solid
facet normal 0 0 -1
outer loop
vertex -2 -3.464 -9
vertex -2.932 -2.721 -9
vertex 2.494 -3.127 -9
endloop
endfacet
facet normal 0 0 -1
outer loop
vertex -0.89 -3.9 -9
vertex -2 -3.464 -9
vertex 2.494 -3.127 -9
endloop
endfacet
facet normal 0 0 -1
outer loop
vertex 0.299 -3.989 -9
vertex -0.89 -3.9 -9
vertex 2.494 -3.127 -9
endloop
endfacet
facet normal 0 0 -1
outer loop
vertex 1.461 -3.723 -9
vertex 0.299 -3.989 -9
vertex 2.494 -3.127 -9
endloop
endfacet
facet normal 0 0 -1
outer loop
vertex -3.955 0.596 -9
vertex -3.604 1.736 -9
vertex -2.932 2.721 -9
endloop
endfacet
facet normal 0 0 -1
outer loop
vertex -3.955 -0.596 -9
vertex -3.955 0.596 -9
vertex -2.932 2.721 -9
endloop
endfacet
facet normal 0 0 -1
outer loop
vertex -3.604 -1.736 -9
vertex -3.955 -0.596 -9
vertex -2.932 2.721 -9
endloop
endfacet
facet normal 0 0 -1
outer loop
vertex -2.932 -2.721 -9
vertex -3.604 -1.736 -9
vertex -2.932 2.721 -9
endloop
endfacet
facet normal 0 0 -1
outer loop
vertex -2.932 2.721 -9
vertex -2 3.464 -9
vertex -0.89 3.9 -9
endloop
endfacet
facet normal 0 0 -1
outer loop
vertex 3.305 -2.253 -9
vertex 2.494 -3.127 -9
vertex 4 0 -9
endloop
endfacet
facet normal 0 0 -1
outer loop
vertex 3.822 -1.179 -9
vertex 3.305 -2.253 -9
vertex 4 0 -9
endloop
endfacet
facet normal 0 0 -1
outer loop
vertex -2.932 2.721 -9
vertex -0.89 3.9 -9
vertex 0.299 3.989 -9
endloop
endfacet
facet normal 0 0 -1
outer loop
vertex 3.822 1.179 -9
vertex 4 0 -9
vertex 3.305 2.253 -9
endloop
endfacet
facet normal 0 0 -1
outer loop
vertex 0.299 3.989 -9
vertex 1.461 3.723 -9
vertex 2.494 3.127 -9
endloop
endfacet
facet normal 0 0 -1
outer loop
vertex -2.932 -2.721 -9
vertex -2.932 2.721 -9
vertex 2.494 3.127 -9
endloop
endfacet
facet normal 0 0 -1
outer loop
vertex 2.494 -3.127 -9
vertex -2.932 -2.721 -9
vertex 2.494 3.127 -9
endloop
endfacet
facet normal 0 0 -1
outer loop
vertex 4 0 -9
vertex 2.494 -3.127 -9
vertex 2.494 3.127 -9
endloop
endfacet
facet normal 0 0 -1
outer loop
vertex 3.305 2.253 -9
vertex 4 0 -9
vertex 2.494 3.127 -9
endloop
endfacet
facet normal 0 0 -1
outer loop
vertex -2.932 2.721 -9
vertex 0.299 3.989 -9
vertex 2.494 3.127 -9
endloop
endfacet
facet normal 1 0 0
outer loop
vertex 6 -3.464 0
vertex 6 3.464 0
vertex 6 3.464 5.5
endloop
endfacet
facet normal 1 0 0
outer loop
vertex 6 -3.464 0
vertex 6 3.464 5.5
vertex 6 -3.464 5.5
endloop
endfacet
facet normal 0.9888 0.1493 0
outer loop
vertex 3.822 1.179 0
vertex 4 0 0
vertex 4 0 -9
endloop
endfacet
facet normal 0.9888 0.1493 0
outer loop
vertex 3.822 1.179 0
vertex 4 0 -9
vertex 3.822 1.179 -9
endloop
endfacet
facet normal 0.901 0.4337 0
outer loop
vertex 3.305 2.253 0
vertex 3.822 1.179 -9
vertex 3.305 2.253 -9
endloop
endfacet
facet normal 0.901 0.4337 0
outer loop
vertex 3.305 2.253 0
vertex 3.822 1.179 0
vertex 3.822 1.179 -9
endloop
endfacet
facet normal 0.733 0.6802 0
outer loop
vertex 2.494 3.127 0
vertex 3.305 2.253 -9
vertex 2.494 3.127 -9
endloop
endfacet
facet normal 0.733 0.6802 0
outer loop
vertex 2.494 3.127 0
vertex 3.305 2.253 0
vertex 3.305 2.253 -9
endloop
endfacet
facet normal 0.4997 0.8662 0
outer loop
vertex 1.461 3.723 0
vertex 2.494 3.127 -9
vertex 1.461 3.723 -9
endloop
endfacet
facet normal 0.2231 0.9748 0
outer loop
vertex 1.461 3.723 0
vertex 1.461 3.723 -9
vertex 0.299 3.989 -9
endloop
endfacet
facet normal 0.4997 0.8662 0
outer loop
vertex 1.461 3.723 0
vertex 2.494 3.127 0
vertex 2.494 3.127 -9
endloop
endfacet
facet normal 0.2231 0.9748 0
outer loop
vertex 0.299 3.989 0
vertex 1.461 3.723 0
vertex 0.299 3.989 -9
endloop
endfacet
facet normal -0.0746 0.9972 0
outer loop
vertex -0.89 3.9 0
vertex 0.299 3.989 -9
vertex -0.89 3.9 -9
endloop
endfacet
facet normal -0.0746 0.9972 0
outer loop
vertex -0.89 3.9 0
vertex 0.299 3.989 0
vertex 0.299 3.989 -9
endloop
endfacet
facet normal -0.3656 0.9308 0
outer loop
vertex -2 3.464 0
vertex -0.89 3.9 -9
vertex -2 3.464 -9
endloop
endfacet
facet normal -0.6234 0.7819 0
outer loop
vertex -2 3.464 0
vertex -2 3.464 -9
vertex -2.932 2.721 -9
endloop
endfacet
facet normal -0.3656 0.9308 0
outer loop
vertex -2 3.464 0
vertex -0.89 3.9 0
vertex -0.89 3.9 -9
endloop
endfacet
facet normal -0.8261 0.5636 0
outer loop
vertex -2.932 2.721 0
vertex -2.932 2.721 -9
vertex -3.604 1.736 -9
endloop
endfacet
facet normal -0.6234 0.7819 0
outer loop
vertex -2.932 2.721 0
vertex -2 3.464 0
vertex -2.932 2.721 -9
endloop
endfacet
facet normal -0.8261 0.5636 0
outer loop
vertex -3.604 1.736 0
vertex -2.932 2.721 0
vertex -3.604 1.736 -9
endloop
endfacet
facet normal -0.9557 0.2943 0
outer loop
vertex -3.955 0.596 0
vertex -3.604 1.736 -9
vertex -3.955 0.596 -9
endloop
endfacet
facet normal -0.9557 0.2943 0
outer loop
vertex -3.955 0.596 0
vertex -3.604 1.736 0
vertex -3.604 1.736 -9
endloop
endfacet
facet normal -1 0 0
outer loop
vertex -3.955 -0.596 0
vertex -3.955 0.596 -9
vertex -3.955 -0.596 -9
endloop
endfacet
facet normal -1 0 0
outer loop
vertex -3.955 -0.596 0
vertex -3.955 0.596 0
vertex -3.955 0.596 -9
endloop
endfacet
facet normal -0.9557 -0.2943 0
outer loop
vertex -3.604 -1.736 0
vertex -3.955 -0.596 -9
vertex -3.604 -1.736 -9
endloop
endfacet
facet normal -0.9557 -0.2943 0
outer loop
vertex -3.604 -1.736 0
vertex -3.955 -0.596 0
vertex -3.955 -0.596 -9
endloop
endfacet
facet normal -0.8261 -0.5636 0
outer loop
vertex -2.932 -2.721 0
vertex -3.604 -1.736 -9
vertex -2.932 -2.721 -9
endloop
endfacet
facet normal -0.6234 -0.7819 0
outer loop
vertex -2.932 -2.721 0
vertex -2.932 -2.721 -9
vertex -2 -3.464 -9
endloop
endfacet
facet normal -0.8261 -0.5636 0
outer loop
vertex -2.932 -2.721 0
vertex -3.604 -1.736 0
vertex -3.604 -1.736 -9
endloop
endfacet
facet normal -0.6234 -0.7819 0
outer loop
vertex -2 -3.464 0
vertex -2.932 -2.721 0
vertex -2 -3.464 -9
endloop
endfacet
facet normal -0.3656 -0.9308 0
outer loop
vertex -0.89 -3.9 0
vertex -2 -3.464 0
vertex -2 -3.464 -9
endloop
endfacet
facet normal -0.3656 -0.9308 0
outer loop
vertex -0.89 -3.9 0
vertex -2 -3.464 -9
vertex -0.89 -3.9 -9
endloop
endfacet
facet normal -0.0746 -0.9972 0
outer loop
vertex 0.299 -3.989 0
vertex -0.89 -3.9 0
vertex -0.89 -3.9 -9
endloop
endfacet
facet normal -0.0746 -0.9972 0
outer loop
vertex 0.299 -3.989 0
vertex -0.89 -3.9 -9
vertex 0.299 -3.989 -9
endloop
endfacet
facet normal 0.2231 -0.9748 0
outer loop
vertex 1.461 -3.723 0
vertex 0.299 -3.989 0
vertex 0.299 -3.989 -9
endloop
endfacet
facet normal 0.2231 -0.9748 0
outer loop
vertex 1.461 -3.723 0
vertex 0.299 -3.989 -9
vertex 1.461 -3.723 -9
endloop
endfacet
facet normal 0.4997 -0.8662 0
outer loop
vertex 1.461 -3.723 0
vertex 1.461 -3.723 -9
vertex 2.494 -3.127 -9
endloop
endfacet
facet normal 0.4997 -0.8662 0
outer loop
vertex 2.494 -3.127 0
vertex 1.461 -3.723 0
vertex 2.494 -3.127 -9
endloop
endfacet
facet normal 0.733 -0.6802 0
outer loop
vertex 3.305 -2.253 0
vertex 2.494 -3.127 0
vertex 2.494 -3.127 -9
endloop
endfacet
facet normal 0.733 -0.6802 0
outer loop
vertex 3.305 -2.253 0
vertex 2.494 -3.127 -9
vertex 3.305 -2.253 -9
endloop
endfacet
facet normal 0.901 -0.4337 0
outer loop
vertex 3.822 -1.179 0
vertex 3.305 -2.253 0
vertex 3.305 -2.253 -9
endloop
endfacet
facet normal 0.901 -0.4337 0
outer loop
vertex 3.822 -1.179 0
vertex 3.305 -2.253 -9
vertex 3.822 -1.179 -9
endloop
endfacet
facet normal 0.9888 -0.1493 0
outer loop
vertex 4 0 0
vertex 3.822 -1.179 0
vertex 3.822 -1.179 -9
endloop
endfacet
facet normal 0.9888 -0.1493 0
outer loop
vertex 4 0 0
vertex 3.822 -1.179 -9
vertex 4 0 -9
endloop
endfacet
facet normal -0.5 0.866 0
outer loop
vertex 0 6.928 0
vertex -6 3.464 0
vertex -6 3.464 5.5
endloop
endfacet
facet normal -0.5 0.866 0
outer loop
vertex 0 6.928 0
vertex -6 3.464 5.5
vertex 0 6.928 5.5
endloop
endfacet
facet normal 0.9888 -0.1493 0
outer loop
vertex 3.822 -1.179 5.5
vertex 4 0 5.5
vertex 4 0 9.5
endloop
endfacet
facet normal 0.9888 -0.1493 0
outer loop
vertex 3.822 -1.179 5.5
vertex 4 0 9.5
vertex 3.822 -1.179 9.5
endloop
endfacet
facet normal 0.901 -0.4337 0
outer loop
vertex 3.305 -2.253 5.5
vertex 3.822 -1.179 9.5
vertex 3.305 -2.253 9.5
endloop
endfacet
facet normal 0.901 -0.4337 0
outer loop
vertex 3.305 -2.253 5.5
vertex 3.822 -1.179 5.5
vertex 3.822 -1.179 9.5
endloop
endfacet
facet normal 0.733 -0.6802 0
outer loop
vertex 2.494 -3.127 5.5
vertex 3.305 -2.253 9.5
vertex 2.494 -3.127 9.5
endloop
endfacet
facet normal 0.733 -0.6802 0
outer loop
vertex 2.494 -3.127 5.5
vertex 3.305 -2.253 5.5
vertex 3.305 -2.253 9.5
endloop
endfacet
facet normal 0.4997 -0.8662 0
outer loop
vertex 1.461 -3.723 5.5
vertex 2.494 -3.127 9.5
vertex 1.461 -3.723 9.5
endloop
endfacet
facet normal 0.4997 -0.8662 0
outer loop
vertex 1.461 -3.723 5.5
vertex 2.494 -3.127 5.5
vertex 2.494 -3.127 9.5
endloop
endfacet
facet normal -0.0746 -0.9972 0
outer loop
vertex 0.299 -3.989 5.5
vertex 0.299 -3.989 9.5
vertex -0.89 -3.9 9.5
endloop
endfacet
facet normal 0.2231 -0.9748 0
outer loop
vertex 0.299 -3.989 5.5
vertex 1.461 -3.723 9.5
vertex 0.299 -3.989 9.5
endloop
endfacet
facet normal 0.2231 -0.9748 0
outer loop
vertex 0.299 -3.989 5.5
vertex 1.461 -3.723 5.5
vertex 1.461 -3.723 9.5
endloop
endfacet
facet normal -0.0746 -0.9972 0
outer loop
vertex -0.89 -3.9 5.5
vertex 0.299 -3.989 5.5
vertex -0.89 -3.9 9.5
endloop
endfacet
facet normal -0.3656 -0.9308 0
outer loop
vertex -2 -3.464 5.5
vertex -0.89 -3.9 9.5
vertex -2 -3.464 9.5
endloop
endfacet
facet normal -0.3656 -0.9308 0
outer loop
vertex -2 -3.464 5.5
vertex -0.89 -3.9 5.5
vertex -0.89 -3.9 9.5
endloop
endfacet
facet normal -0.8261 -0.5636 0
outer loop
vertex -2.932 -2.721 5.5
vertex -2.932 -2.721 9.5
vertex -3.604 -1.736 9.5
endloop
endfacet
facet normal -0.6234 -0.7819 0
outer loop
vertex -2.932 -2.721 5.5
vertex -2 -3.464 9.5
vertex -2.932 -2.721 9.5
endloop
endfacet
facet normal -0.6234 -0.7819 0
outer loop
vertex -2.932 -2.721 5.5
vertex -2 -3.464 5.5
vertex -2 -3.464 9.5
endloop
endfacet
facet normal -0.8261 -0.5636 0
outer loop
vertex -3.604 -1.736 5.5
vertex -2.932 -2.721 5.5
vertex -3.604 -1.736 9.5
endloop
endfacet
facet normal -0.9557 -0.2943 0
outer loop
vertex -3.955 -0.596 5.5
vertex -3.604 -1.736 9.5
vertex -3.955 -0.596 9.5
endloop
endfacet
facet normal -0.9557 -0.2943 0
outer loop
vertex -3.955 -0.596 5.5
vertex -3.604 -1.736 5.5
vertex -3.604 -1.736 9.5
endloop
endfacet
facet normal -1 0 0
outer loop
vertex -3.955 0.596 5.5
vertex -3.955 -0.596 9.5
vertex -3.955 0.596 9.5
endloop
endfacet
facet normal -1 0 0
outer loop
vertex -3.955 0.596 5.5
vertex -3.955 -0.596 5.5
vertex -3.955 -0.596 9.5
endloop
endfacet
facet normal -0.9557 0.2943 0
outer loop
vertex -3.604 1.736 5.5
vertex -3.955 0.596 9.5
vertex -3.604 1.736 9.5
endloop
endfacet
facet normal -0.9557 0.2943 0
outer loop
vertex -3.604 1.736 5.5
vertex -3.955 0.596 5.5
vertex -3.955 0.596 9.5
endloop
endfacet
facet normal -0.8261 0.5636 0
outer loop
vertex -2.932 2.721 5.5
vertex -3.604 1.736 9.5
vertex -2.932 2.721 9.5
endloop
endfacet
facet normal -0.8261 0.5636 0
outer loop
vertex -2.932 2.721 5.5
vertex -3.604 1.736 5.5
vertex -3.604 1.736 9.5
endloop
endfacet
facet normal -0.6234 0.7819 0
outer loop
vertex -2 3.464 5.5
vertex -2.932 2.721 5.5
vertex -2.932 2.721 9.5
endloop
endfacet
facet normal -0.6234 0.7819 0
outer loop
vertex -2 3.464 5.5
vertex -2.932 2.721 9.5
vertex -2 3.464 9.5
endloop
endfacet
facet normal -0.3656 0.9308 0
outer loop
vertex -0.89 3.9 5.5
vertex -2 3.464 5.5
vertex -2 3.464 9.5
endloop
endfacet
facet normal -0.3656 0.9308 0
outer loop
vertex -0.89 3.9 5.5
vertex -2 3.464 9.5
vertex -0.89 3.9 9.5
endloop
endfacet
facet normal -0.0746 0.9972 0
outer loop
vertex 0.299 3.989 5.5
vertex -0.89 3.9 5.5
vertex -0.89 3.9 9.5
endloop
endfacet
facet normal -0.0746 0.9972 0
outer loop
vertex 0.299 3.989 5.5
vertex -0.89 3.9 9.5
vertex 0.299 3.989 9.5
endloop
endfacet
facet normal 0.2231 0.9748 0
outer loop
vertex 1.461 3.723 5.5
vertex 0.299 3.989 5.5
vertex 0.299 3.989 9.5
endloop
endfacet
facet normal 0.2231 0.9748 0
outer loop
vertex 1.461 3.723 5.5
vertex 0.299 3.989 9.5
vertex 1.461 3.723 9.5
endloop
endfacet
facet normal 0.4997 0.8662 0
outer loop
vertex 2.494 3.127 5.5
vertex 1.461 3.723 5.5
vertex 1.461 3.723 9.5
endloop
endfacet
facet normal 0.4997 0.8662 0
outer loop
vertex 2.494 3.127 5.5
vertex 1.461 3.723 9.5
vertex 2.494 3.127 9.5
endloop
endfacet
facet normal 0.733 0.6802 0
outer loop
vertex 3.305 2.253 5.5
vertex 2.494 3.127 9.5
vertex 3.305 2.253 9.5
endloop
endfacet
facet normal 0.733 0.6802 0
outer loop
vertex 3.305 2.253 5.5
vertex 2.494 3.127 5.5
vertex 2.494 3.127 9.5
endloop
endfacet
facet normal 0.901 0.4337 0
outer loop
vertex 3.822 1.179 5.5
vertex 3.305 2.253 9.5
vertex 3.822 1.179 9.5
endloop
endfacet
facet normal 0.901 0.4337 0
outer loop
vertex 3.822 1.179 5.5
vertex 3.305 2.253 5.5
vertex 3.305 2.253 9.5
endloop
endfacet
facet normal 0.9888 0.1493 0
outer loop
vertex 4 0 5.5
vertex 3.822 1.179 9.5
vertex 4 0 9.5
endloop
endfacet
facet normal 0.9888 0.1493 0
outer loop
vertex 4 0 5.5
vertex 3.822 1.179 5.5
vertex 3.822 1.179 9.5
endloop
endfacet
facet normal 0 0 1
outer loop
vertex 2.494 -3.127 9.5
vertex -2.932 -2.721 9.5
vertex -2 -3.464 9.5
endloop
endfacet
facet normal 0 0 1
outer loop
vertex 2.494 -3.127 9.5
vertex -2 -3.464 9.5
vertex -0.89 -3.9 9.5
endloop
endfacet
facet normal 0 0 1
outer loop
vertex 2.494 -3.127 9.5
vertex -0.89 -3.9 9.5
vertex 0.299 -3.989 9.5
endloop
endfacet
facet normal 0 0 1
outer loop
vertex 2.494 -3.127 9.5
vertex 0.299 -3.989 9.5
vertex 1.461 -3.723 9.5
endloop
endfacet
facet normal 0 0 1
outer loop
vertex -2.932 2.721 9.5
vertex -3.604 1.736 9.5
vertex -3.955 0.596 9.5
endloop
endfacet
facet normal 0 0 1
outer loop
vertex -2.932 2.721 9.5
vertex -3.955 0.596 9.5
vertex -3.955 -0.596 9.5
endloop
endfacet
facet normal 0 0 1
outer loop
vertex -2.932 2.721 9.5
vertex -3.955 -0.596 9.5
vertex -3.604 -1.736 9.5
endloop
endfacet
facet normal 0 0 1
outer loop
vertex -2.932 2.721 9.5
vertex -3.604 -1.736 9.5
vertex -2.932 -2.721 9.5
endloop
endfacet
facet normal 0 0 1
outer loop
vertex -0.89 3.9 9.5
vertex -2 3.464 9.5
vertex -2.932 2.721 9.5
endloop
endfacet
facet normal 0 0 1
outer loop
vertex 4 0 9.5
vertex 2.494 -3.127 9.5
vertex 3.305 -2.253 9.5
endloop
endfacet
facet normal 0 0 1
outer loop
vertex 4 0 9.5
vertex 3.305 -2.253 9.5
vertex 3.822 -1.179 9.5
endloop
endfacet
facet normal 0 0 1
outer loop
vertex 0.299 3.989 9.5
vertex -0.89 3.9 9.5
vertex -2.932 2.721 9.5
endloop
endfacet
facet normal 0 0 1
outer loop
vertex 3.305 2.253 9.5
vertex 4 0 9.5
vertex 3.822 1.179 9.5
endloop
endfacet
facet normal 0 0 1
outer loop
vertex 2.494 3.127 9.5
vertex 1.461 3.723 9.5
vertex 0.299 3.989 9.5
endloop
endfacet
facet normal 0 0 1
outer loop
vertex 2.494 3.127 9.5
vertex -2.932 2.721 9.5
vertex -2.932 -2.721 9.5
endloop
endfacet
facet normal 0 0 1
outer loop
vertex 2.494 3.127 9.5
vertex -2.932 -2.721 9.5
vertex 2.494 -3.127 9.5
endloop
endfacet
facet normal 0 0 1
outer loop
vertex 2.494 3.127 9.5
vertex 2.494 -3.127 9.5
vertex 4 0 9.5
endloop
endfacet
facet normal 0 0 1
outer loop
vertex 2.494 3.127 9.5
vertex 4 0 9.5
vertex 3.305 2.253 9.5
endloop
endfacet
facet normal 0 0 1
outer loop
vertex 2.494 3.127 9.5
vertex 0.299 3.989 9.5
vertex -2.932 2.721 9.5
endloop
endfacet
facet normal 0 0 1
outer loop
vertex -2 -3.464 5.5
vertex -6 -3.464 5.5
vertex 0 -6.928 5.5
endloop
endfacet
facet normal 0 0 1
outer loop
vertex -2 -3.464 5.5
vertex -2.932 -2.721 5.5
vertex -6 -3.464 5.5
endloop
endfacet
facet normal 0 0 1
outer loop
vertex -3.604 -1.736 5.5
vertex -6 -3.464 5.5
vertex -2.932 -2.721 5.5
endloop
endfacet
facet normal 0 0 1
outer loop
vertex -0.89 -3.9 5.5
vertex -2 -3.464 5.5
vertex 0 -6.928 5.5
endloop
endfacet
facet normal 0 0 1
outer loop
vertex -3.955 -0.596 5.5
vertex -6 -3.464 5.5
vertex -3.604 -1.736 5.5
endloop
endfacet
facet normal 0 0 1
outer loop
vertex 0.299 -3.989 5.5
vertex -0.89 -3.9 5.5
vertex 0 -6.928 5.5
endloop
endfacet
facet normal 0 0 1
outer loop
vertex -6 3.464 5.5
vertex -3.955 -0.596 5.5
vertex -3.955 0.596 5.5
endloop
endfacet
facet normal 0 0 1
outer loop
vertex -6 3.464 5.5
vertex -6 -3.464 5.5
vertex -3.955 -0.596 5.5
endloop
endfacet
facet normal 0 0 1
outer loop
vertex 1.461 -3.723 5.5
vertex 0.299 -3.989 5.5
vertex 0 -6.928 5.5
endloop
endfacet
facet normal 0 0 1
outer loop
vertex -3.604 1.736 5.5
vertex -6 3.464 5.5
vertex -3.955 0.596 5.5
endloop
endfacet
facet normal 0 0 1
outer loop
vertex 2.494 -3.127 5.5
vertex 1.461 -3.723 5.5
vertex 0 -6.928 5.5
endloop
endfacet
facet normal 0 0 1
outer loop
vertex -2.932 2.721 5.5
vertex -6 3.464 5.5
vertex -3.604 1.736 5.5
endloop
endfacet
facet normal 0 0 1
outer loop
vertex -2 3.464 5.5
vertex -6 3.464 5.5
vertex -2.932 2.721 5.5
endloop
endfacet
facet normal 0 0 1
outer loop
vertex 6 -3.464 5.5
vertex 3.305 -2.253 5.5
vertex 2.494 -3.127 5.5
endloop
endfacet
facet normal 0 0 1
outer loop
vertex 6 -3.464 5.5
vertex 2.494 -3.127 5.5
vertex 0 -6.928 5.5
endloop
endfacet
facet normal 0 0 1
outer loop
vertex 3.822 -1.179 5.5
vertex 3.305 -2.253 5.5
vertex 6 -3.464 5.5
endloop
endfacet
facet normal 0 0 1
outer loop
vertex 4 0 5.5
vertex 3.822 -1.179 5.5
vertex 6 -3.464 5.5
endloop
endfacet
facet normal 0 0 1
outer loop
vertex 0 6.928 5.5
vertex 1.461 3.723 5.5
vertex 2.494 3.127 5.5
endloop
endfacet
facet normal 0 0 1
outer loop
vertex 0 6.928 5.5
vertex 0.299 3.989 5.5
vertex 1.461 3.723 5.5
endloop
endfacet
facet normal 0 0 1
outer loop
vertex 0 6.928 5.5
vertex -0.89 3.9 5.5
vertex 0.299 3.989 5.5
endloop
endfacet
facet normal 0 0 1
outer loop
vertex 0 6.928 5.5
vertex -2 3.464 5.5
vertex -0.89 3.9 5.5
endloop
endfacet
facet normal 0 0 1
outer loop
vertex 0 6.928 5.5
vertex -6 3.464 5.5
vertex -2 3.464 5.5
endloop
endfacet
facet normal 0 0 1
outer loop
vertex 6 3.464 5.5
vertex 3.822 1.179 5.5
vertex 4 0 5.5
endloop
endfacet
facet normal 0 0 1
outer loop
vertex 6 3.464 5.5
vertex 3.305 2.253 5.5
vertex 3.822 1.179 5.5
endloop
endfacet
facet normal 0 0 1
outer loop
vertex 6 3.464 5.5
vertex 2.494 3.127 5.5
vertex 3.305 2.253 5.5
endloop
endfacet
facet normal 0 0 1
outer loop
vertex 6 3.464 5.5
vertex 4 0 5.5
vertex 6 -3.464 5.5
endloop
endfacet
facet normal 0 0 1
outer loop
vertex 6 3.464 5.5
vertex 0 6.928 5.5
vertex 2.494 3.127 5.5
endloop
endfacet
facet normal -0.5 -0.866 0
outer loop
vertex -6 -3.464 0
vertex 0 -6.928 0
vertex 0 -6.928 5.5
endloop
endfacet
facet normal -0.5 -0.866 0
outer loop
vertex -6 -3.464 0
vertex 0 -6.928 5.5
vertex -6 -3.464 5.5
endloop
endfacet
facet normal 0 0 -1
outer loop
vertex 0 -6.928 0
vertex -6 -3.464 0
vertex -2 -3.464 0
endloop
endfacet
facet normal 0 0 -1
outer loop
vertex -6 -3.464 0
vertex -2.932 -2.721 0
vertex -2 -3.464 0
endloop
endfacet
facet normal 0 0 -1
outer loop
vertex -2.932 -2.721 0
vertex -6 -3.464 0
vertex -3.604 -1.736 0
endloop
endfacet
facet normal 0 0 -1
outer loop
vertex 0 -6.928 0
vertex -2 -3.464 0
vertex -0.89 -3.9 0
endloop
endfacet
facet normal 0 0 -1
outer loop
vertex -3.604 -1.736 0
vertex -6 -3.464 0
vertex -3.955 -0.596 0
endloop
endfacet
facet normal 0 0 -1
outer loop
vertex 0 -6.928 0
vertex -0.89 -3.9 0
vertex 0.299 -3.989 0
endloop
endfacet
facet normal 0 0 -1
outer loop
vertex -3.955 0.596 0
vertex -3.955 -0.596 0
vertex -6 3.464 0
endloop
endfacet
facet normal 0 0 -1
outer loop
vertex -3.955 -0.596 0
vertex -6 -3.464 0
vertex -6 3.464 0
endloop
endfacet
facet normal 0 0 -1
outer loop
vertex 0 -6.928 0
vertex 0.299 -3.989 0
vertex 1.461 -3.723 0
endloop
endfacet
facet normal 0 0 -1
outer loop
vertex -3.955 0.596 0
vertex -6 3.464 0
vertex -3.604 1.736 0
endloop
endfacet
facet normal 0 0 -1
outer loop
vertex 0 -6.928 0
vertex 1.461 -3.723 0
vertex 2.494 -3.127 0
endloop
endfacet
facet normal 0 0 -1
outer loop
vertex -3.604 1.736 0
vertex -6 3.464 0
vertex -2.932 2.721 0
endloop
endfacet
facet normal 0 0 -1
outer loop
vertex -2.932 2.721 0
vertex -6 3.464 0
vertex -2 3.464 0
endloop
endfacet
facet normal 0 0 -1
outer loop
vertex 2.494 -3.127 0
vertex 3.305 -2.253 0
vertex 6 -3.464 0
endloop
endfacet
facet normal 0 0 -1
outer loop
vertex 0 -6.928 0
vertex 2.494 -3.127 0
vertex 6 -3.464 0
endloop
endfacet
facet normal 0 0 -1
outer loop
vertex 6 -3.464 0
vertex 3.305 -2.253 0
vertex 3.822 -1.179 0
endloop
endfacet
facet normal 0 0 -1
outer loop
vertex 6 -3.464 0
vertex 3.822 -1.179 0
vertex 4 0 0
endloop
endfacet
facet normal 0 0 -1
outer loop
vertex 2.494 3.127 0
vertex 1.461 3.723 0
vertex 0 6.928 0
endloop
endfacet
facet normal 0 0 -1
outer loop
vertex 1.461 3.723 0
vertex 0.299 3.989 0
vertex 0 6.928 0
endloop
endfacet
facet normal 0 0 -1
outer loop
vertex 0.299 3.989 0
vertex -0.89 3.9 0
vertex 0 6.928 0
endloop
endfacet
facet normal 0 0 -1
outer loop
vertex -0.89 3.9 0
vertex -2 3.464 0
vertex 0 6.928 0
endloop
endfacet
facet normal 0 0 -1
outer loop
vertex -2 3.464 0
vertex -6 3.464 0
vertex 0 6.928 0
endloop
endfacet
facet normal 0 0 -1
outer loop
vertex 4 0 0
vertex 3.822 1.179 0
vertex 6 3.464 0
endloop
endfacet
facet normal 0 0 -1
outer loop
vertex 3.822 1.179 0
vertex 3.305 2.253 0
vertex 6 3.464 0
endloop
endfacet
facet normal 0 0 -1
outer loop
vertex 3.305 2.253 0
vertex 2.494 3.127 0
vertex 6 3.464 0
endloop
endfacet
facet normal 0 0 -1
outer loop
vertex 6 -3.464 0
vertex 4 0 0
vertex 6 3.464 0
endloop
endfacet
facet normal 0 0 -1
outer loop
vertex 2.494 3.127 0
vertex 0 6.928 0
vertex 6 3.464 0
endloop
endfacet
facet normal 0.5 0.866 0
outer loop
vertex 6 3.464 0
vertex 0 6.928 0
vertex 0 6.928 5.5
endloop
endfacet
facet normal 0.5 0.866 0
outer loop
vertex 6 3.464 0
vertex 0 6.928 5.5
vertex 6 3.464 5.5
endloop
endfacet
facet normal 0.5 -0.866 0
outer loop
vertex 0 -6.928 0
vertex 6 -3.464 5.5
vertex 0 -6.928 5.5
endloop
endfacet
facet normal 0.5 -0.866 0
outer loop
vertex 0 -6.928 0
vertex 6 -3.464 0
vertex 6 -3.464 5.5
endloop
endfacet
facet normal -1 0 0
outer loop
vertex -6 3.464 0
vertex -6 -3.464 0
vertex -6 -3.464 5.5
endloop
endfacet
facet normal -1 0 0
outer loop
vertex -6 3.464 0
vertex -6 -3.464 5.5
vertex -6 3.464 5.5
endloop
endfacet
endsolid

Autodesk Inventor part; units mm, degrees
ref_plane "YZ Plane" through (0, 0, 0) normal (1, 0, 0) x (0, 1, 0)
ref_plane "XZ Plane" through (0, 0, 0) normal (0, 1, 0) x (-1, 0, 0)
ref_plane "XY Plane" through (0, 0, 0) normal (0, 0, 1) x (1, 0, 0)
sketch "Sketch1" plane through (0, 0, 0) normal (0, 0, 1) x (1, 0, 0)
  line L0 (0, 6.9282) -> (6, 3.4641)
  line L1 (6, 3.4641) -> (6, -3.4641)
  line L2 (6, -3.4641) -> (0, -6.9282)
  line L3 (0, -6.9282) -> (-6, -3.4641)
  line L4 (-6, -3.4641) -> (-6, 3.4641)
  line L5 (-6, 3.4641) -> (0, 6.9282)
  point P0 (0, 0)
  point P1 (0, 0)
  dimension "d0" = 12
extrude "Extrusion1" add sketch "Sketch1" along normal blind 5.5
sketch "Sketch2" plane through (0, 0, 5.5) normal (0, 0, 1) x (1, 0, 0)
  circle A0 centre (0, 0) radius 4
  dimension "d3" = 8
extrude "Extrusion2" add sketch "Sketch2" along normal blind 4 and the other way blind 14.5
thread "Thread1" size "M8x1.25" class "6g" standard "ANSI Metric M Profile" length 45
properties part number "hudson-1-46"
